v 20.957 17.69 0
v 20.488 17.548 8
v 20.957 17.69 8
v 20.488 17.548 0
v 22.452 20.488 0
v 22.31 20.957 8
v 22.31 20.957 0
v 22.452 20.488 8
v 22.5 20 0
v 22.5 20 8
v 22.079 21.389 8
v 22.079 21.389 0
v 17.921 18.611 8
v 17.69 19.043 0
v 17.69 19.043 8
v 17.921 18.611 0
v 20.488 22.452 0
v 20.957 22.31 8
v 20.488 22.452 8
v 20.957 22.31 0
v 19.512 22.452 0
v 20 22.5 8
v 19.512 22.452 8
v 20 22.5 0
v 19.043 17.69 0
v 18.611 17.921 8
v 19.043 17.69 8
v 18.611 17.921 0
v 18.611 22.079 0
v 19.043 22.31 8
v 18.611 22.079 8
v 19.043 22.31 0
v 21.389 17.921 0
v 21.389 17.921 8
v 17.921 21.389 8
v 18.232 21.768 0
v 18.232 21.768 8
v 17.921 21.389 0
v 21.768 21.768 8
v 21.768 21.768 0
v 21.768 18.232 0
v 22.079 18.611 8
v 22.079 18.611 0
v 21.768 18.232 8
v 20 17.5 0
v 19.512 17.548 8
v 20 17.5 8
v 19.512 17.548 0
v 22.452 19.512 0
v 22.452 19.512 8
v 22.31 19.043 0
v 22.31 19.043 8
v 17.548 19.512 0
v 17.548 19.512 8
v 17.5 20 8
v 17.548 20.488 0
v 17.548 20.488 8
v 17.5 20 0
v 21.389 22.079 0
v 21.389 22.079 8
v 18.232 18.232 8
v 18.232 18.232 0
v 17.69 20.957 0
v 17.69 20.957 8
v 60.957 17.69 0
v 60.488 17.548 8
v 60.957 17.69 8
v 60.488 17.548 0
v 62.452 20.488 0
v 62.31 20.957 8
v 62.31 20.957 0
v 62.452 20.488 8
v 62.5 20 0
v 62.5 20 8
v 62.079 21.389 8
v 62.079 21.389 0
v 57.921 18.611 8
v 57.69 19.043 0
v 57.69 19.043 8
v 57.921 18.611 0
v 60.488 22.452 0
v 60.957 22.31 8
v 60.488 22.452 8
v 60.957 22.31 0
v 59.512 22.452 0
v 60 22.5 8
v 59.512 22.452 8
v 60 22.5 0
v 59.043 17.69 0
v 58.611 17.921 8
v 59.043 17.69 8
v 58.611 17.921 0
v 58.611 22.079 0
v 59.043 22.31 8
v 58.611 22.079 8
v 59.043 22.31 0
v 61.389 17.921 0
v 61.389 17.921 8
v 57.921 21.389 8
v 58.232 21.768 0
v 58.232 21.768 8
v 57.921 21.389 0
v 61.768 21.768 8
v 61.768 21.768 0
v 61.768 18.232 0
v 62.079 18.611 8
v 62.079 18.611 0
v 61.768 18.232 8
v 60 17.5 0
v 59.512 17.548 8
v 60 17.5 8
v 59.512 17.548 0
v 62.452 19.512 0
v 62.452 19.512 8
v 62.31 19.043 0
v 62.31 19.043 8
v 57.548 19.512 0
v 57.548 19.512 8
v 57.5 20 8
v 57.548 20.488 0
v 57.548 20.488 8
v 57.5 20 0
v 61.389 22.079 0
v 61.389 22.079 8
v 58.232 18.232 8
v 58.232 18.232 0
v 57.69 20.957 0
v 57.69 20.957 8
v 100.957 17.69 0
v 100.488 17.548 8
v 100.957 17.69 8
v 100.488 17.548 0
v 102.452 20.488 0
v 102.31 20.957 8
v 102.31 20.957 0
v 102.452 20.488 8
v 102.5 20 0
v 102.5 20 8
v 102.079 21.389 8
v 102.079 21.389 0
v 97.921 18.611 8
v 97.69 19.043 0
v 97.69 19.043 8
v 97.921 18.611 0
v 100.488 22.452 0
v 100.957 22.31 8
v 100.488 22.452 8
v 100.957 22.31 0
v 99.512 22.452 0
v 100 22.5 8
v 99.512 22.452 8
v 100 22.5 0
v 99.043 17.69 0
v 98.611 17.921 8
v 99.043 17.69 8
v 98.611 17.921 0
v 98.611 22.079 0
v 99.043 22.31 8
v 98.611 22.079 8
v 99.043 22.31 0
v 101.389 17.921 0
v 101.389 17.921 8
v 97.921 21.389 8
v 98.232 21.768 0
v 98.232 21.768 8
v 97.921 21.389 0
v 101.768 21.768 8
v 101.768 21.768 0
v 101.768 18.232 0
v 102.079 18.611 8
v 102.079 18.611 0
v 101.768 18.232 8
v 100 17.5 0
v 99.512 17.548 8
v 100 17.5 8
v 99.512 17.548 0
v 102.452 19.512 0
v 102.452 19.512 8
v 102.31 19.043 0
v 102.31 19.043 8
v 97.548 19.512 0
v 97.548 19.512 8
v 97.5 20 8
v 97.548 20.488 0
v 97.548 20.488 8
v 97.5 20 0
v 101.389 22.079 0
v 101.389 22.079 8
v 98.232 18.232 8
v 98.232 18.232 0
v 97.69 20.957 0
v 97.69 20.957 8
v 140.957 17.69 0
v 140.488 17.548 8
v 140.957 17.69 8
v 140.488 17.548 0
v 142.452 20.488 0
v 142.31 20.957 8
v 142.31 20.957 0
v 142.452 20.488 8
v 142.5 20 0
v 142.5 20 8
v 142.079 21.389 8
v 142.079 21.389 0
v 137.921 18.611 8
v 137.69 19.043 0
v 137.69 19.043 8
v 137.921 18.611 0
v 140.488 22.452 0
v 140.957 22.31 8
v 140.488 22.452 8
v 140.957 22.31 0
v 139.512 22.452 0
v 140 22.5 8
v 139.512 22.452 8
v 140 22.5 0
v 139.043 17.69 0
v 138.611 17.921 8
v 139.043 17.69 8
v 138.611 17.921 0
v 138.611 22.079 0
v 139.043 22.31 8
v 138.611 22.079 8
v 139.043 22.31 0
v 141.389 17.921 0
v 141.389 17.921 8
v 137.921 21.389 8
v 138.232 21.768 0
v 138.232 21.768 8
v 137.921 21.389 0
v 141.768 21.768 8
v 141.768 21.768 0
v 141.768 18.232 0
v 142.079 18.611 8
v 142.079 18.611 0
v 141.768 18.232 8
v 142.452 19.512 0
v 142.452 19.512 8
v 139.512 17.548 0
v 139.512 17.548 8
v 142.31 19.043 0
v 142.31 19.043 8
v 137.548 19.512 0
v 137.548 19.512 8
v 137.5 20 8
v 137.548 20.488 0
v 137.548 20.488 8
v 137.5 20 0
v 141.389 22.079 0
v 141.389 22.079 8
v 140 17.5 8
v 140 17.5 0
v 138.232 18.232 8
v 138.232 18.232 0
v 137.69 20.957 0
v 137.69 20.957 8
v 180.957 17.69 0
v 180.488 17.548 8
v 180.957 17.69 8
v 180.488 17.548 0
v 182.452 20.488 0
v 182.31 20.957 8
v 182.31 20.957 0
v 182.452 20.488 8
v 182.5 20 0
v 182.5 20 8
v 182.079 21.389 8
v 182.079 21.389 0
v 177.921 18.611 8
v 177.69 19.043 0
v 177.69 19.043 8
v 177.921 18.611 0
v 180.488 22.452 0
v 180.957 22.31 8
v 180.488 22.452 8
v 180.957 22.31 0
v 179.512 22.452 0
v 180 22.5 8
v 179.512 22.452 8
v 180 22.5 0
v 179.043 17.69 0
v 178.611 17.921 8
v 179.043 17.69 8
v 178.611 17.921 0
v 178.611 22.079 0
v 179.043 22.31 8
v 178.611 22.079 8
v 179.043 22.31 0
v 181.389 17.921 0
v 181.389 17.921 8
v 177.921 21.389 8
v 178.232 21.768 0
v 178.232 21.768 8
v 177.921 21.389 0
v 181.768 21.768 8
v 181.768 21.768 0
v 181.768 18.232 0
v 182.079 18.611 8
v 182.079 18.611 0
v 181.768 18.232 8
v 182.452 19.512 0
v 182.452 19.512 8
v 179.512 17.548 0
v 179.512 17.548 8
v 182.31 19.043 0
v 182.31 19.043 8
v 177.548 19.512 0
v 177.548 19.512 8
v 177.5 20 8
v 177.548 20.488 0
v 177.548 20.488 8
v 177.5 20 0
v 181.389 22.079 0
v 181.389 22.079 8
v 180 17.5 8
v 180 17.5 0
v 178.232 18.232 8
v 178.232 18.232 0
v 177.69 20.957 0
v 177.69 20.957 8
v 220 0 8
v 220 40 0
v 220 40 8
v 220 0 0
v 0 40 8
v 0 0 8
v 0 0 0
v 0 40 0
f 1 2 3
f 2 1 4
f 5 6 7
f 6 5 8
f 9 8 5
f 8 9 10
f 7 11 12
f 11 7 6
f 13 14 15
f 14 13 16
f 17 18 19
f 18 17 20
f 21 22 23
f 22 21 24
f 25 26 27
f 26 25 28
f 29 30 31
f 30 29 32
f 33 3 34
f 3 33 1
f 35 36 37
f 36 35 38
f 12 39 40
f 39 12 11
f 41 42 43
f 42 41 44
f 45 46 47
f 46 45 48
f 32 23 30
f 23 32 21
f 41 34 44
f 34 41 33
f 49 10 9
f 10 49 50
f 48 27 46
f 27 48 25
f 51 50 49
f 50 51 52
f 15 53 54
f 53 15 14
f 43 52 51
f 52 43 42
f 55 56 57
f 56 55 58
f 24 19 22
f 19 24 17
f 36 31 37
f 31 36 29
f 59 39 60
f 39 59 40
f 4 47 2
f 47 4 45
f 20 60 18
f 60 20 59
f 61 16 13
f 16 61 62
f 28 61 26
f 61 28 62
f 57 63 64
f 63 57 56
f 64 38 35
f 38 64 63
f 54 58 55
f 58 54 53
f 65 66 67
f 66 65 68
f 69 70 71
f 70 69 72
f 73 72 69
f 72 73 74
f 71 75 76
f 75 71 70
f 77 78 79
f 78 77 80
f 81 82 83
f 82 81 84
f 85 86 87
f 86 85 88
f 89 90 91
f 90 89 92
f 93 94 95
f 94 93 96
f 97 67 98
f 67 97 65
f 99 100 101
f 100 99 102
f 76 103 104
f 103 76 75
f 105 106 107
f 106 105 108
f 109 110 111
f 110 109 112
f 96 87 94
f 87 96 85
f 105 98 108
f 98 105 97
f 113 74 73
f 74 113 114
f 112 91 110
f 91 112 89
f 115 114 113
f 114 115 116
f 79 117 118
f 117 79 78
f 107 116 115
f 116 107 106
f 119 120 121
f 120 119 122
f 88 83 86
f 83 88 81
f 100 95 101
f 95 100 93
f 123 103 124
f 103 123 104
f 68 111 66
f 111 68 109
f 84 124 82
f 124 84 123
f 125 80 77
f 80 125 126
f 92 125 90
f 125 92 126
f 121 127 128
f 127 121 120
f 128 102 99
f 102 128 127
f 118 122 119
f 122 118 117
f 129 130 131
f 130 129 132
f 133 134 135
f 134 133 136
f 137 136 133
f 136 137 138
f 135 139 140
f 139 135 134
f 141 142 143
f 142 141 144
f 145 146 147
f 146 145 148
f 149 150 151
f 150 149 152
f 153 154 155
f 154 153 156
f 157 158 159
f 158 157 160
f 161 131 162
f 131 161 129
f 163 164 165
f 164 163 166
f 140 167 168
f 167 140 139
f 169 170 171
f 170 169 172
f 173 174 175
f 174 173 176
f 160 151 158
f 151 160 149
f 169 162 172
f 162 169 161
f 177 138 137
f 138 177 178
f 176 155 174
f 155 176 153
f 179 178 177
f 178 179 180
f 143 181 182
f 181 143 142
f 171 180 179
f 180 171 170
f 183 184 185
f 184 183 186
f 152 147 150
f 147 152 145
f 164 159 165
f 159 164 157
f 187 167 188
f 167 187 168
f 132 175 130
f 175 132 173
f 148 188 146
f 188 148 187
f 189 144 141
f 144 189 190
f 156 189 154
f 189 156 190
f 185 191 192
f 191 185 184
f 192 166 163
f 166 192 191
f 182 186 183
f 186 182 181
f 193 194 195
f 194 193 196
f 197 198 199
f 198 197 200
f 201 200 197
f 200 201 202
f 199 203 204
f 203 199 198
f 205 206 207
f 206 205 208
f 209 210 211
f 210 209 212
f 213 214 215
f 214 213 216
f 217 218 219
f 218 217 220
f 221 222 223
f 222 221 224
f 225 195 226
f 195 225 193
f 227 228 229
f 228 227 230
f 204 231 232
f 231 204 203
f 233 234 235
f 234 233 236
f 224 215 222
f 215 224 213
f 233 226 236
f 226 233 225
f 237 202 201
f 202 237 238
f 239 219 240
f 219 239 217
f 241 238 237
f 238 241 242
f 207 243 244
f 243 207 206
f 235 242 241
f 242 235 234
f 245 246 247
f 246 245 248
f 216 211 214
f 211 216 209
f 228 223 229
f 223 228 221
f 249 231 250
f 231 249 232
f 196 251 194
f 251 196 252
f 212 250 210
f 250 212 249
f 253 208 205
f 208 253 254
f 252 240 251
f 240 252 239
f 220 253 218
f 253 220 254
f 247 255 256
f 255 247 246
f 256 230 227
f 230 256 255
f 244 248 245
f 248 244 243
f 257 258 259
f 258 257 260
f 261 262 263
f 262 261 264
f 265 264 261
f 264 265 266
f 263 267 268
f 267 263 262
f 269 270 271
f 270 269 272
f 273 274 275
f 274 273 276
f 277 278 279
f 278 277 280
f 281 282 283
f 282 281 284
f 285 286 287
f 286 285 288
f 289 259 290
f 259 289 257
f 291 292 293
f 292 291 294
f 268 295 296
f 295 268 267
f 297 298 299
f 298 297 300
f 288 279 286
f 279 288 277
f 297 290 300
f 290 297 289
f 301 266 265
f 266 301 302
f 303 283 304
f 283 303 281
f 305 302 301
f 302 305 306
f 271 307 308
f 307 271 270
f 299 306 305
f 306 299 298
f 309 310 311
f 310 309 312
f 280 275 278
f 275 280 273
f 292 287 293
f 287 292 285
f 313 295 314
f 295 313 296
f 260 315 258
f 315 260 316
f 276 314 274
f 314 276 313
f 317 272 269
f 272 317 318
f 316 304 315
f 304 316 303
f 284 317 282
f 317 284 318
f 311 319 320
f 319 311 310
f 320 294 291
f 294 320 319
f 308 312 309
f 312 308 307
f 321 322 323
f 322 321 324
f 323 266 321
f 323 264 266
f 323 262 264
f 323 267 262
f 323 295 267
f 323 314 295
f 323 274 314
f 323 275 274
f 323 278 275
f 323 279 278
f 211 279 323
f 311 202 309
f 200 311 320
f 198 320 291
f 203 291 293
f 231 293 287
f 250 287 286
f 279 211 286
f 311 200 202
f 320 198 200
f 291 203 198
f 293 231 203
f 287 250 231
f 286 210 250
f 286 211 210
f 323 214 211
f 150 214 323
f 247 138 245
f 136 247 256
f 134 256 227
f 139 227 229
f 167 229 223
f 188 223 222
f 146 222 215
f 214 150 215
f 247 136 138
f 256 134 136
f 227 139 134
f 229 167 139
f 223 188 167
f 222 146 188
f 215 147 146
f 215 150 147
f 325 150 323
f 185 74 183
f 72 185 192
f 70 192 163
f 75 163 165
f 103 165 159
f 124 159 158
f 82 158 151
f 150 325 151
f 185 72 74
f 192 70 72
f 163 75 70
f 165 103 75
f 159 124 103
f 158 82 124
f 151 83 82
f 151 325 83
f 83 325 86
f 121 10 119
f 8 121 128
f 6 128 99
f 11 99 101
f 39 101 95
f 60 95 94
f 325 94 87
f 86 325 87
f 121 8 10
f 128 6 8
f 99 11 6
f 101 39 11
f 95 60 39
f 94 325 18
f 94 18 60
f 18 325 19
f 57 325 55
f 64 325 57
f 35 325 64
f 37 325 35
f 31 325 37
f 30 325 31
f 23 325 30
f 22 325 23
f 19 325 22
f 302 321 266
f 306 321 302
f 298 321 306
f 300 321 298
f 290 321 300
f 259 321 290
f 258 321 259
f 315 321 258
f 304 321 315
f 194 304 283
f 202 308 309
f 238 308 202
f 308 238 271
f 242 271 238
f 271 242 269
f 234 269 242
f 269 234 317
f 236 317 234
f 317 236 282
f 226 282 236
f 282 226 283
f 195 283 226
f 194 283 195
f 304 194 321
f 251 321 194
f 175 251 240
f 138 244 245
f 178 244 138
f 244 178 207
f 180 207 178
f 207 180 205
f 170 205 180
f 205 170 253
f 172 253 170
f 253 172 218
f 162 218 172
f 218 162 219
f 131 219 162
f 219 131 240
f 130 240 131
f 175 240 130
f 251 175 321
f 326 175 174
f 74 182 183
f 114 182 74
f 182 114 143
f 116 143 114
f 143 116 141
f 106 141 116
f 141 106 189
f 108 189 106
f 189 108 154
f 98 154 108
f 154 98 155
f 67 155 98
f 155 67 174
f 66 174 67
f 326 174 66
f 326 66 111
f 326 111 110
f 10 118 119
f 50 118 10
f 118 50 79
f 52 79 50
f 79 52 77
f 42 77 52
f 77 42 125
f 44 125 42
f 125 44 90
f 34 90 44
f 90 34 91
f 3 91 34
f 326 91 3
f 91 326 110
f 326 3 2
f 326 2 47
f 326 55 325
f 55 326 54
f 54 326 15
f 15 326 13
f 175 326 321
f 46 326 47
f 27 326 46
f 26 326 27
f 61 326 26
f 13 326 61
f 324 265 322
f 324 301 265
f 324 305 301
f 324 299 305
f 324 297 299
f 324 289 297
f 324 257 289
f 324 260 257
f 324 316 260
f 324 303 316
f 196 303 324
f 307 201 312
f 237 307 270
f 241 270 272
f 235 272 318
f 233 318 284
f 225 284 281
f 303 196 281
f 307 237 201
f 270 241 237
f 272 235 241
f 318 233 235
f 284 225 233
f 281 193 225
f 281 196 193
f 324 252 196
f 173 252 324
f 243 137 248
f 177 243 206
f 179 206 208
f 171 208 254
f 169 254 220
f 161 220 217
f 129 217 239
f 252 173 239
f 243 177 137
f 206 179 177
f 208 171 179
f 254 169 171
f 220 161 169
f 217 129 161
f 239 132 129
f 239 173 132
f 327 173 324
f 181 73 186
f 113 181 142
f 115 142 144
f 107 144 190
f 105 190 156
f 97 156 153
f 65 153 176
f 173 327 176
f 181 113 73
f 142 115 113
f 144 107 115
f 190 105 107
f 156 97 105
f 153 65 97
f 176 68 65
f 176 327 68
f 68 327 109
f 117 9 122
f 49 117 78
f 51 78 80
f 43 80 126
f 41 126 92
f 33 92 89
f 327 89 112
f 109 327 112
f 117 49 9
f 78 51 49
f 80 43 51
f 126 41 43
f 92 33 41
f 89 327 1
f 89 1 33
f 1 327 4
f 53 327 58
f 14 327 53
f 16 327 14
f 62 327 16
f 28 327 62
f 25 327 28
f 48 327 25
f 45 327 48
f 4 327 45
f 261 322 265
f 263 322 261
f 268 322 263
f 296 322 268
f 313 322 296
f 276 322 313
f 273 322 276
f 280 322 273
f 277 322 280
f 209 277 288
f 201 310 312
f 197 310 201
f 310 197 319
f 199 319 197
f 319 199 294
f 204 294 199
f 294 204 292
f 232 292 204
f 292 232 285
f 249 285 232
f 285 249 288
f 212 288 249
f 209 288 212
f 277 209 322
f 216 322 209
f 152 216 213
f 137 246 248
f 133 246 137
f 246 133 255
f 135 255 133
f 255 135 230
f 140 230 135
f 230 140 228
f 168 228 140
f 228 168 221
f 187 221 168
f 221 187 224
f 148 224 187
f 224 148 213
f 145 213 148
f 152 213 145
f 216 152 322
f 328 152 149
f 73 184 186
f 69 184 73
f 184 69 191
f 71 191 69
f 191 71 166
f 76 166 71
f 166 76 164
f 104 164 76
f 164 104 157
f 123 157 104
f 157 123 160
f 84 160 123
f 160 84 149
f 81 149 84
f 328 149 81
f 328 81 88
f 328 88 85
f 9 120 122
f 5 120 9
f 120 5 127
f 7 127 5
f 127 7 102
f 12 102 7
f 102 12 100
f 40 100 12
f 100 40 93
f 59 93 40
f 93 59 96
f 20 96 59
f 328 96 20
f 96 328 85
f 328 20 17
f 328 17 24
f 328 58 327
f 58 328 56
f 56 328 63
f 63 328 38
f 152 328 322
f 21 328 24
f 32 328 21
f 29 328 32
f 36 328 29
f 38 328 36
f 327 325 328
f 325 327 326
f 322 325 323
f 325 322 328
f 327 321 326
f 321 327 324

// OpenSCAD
$fn = 32;

// ----------------------------------------------------------------------
// Long rail: 200-250 mm mounting rail
// ----------------------------------------------------------------------

// --- parameters (mm) ---
rail_l = 220;             // rail length, X
rail_w = 40;              // rail width, Y
rail_t = 8;               // rail thickness, Z
hole_d = 5;               // mounting hole diameter
hole_start = 20;          // first hole offset from the end
hole_pitch = 40;          // hole pitch
holes = 5;                // number of holes

difference() {
  cube([rail_l, rail_w, rail_t]);
  for (i = [0 : holes - 1])
    translate([hole_start + i * hole_pitch, rail_w / 2, -1])
      cylinder(h = rail_t + 2, d = hole_d);
}
